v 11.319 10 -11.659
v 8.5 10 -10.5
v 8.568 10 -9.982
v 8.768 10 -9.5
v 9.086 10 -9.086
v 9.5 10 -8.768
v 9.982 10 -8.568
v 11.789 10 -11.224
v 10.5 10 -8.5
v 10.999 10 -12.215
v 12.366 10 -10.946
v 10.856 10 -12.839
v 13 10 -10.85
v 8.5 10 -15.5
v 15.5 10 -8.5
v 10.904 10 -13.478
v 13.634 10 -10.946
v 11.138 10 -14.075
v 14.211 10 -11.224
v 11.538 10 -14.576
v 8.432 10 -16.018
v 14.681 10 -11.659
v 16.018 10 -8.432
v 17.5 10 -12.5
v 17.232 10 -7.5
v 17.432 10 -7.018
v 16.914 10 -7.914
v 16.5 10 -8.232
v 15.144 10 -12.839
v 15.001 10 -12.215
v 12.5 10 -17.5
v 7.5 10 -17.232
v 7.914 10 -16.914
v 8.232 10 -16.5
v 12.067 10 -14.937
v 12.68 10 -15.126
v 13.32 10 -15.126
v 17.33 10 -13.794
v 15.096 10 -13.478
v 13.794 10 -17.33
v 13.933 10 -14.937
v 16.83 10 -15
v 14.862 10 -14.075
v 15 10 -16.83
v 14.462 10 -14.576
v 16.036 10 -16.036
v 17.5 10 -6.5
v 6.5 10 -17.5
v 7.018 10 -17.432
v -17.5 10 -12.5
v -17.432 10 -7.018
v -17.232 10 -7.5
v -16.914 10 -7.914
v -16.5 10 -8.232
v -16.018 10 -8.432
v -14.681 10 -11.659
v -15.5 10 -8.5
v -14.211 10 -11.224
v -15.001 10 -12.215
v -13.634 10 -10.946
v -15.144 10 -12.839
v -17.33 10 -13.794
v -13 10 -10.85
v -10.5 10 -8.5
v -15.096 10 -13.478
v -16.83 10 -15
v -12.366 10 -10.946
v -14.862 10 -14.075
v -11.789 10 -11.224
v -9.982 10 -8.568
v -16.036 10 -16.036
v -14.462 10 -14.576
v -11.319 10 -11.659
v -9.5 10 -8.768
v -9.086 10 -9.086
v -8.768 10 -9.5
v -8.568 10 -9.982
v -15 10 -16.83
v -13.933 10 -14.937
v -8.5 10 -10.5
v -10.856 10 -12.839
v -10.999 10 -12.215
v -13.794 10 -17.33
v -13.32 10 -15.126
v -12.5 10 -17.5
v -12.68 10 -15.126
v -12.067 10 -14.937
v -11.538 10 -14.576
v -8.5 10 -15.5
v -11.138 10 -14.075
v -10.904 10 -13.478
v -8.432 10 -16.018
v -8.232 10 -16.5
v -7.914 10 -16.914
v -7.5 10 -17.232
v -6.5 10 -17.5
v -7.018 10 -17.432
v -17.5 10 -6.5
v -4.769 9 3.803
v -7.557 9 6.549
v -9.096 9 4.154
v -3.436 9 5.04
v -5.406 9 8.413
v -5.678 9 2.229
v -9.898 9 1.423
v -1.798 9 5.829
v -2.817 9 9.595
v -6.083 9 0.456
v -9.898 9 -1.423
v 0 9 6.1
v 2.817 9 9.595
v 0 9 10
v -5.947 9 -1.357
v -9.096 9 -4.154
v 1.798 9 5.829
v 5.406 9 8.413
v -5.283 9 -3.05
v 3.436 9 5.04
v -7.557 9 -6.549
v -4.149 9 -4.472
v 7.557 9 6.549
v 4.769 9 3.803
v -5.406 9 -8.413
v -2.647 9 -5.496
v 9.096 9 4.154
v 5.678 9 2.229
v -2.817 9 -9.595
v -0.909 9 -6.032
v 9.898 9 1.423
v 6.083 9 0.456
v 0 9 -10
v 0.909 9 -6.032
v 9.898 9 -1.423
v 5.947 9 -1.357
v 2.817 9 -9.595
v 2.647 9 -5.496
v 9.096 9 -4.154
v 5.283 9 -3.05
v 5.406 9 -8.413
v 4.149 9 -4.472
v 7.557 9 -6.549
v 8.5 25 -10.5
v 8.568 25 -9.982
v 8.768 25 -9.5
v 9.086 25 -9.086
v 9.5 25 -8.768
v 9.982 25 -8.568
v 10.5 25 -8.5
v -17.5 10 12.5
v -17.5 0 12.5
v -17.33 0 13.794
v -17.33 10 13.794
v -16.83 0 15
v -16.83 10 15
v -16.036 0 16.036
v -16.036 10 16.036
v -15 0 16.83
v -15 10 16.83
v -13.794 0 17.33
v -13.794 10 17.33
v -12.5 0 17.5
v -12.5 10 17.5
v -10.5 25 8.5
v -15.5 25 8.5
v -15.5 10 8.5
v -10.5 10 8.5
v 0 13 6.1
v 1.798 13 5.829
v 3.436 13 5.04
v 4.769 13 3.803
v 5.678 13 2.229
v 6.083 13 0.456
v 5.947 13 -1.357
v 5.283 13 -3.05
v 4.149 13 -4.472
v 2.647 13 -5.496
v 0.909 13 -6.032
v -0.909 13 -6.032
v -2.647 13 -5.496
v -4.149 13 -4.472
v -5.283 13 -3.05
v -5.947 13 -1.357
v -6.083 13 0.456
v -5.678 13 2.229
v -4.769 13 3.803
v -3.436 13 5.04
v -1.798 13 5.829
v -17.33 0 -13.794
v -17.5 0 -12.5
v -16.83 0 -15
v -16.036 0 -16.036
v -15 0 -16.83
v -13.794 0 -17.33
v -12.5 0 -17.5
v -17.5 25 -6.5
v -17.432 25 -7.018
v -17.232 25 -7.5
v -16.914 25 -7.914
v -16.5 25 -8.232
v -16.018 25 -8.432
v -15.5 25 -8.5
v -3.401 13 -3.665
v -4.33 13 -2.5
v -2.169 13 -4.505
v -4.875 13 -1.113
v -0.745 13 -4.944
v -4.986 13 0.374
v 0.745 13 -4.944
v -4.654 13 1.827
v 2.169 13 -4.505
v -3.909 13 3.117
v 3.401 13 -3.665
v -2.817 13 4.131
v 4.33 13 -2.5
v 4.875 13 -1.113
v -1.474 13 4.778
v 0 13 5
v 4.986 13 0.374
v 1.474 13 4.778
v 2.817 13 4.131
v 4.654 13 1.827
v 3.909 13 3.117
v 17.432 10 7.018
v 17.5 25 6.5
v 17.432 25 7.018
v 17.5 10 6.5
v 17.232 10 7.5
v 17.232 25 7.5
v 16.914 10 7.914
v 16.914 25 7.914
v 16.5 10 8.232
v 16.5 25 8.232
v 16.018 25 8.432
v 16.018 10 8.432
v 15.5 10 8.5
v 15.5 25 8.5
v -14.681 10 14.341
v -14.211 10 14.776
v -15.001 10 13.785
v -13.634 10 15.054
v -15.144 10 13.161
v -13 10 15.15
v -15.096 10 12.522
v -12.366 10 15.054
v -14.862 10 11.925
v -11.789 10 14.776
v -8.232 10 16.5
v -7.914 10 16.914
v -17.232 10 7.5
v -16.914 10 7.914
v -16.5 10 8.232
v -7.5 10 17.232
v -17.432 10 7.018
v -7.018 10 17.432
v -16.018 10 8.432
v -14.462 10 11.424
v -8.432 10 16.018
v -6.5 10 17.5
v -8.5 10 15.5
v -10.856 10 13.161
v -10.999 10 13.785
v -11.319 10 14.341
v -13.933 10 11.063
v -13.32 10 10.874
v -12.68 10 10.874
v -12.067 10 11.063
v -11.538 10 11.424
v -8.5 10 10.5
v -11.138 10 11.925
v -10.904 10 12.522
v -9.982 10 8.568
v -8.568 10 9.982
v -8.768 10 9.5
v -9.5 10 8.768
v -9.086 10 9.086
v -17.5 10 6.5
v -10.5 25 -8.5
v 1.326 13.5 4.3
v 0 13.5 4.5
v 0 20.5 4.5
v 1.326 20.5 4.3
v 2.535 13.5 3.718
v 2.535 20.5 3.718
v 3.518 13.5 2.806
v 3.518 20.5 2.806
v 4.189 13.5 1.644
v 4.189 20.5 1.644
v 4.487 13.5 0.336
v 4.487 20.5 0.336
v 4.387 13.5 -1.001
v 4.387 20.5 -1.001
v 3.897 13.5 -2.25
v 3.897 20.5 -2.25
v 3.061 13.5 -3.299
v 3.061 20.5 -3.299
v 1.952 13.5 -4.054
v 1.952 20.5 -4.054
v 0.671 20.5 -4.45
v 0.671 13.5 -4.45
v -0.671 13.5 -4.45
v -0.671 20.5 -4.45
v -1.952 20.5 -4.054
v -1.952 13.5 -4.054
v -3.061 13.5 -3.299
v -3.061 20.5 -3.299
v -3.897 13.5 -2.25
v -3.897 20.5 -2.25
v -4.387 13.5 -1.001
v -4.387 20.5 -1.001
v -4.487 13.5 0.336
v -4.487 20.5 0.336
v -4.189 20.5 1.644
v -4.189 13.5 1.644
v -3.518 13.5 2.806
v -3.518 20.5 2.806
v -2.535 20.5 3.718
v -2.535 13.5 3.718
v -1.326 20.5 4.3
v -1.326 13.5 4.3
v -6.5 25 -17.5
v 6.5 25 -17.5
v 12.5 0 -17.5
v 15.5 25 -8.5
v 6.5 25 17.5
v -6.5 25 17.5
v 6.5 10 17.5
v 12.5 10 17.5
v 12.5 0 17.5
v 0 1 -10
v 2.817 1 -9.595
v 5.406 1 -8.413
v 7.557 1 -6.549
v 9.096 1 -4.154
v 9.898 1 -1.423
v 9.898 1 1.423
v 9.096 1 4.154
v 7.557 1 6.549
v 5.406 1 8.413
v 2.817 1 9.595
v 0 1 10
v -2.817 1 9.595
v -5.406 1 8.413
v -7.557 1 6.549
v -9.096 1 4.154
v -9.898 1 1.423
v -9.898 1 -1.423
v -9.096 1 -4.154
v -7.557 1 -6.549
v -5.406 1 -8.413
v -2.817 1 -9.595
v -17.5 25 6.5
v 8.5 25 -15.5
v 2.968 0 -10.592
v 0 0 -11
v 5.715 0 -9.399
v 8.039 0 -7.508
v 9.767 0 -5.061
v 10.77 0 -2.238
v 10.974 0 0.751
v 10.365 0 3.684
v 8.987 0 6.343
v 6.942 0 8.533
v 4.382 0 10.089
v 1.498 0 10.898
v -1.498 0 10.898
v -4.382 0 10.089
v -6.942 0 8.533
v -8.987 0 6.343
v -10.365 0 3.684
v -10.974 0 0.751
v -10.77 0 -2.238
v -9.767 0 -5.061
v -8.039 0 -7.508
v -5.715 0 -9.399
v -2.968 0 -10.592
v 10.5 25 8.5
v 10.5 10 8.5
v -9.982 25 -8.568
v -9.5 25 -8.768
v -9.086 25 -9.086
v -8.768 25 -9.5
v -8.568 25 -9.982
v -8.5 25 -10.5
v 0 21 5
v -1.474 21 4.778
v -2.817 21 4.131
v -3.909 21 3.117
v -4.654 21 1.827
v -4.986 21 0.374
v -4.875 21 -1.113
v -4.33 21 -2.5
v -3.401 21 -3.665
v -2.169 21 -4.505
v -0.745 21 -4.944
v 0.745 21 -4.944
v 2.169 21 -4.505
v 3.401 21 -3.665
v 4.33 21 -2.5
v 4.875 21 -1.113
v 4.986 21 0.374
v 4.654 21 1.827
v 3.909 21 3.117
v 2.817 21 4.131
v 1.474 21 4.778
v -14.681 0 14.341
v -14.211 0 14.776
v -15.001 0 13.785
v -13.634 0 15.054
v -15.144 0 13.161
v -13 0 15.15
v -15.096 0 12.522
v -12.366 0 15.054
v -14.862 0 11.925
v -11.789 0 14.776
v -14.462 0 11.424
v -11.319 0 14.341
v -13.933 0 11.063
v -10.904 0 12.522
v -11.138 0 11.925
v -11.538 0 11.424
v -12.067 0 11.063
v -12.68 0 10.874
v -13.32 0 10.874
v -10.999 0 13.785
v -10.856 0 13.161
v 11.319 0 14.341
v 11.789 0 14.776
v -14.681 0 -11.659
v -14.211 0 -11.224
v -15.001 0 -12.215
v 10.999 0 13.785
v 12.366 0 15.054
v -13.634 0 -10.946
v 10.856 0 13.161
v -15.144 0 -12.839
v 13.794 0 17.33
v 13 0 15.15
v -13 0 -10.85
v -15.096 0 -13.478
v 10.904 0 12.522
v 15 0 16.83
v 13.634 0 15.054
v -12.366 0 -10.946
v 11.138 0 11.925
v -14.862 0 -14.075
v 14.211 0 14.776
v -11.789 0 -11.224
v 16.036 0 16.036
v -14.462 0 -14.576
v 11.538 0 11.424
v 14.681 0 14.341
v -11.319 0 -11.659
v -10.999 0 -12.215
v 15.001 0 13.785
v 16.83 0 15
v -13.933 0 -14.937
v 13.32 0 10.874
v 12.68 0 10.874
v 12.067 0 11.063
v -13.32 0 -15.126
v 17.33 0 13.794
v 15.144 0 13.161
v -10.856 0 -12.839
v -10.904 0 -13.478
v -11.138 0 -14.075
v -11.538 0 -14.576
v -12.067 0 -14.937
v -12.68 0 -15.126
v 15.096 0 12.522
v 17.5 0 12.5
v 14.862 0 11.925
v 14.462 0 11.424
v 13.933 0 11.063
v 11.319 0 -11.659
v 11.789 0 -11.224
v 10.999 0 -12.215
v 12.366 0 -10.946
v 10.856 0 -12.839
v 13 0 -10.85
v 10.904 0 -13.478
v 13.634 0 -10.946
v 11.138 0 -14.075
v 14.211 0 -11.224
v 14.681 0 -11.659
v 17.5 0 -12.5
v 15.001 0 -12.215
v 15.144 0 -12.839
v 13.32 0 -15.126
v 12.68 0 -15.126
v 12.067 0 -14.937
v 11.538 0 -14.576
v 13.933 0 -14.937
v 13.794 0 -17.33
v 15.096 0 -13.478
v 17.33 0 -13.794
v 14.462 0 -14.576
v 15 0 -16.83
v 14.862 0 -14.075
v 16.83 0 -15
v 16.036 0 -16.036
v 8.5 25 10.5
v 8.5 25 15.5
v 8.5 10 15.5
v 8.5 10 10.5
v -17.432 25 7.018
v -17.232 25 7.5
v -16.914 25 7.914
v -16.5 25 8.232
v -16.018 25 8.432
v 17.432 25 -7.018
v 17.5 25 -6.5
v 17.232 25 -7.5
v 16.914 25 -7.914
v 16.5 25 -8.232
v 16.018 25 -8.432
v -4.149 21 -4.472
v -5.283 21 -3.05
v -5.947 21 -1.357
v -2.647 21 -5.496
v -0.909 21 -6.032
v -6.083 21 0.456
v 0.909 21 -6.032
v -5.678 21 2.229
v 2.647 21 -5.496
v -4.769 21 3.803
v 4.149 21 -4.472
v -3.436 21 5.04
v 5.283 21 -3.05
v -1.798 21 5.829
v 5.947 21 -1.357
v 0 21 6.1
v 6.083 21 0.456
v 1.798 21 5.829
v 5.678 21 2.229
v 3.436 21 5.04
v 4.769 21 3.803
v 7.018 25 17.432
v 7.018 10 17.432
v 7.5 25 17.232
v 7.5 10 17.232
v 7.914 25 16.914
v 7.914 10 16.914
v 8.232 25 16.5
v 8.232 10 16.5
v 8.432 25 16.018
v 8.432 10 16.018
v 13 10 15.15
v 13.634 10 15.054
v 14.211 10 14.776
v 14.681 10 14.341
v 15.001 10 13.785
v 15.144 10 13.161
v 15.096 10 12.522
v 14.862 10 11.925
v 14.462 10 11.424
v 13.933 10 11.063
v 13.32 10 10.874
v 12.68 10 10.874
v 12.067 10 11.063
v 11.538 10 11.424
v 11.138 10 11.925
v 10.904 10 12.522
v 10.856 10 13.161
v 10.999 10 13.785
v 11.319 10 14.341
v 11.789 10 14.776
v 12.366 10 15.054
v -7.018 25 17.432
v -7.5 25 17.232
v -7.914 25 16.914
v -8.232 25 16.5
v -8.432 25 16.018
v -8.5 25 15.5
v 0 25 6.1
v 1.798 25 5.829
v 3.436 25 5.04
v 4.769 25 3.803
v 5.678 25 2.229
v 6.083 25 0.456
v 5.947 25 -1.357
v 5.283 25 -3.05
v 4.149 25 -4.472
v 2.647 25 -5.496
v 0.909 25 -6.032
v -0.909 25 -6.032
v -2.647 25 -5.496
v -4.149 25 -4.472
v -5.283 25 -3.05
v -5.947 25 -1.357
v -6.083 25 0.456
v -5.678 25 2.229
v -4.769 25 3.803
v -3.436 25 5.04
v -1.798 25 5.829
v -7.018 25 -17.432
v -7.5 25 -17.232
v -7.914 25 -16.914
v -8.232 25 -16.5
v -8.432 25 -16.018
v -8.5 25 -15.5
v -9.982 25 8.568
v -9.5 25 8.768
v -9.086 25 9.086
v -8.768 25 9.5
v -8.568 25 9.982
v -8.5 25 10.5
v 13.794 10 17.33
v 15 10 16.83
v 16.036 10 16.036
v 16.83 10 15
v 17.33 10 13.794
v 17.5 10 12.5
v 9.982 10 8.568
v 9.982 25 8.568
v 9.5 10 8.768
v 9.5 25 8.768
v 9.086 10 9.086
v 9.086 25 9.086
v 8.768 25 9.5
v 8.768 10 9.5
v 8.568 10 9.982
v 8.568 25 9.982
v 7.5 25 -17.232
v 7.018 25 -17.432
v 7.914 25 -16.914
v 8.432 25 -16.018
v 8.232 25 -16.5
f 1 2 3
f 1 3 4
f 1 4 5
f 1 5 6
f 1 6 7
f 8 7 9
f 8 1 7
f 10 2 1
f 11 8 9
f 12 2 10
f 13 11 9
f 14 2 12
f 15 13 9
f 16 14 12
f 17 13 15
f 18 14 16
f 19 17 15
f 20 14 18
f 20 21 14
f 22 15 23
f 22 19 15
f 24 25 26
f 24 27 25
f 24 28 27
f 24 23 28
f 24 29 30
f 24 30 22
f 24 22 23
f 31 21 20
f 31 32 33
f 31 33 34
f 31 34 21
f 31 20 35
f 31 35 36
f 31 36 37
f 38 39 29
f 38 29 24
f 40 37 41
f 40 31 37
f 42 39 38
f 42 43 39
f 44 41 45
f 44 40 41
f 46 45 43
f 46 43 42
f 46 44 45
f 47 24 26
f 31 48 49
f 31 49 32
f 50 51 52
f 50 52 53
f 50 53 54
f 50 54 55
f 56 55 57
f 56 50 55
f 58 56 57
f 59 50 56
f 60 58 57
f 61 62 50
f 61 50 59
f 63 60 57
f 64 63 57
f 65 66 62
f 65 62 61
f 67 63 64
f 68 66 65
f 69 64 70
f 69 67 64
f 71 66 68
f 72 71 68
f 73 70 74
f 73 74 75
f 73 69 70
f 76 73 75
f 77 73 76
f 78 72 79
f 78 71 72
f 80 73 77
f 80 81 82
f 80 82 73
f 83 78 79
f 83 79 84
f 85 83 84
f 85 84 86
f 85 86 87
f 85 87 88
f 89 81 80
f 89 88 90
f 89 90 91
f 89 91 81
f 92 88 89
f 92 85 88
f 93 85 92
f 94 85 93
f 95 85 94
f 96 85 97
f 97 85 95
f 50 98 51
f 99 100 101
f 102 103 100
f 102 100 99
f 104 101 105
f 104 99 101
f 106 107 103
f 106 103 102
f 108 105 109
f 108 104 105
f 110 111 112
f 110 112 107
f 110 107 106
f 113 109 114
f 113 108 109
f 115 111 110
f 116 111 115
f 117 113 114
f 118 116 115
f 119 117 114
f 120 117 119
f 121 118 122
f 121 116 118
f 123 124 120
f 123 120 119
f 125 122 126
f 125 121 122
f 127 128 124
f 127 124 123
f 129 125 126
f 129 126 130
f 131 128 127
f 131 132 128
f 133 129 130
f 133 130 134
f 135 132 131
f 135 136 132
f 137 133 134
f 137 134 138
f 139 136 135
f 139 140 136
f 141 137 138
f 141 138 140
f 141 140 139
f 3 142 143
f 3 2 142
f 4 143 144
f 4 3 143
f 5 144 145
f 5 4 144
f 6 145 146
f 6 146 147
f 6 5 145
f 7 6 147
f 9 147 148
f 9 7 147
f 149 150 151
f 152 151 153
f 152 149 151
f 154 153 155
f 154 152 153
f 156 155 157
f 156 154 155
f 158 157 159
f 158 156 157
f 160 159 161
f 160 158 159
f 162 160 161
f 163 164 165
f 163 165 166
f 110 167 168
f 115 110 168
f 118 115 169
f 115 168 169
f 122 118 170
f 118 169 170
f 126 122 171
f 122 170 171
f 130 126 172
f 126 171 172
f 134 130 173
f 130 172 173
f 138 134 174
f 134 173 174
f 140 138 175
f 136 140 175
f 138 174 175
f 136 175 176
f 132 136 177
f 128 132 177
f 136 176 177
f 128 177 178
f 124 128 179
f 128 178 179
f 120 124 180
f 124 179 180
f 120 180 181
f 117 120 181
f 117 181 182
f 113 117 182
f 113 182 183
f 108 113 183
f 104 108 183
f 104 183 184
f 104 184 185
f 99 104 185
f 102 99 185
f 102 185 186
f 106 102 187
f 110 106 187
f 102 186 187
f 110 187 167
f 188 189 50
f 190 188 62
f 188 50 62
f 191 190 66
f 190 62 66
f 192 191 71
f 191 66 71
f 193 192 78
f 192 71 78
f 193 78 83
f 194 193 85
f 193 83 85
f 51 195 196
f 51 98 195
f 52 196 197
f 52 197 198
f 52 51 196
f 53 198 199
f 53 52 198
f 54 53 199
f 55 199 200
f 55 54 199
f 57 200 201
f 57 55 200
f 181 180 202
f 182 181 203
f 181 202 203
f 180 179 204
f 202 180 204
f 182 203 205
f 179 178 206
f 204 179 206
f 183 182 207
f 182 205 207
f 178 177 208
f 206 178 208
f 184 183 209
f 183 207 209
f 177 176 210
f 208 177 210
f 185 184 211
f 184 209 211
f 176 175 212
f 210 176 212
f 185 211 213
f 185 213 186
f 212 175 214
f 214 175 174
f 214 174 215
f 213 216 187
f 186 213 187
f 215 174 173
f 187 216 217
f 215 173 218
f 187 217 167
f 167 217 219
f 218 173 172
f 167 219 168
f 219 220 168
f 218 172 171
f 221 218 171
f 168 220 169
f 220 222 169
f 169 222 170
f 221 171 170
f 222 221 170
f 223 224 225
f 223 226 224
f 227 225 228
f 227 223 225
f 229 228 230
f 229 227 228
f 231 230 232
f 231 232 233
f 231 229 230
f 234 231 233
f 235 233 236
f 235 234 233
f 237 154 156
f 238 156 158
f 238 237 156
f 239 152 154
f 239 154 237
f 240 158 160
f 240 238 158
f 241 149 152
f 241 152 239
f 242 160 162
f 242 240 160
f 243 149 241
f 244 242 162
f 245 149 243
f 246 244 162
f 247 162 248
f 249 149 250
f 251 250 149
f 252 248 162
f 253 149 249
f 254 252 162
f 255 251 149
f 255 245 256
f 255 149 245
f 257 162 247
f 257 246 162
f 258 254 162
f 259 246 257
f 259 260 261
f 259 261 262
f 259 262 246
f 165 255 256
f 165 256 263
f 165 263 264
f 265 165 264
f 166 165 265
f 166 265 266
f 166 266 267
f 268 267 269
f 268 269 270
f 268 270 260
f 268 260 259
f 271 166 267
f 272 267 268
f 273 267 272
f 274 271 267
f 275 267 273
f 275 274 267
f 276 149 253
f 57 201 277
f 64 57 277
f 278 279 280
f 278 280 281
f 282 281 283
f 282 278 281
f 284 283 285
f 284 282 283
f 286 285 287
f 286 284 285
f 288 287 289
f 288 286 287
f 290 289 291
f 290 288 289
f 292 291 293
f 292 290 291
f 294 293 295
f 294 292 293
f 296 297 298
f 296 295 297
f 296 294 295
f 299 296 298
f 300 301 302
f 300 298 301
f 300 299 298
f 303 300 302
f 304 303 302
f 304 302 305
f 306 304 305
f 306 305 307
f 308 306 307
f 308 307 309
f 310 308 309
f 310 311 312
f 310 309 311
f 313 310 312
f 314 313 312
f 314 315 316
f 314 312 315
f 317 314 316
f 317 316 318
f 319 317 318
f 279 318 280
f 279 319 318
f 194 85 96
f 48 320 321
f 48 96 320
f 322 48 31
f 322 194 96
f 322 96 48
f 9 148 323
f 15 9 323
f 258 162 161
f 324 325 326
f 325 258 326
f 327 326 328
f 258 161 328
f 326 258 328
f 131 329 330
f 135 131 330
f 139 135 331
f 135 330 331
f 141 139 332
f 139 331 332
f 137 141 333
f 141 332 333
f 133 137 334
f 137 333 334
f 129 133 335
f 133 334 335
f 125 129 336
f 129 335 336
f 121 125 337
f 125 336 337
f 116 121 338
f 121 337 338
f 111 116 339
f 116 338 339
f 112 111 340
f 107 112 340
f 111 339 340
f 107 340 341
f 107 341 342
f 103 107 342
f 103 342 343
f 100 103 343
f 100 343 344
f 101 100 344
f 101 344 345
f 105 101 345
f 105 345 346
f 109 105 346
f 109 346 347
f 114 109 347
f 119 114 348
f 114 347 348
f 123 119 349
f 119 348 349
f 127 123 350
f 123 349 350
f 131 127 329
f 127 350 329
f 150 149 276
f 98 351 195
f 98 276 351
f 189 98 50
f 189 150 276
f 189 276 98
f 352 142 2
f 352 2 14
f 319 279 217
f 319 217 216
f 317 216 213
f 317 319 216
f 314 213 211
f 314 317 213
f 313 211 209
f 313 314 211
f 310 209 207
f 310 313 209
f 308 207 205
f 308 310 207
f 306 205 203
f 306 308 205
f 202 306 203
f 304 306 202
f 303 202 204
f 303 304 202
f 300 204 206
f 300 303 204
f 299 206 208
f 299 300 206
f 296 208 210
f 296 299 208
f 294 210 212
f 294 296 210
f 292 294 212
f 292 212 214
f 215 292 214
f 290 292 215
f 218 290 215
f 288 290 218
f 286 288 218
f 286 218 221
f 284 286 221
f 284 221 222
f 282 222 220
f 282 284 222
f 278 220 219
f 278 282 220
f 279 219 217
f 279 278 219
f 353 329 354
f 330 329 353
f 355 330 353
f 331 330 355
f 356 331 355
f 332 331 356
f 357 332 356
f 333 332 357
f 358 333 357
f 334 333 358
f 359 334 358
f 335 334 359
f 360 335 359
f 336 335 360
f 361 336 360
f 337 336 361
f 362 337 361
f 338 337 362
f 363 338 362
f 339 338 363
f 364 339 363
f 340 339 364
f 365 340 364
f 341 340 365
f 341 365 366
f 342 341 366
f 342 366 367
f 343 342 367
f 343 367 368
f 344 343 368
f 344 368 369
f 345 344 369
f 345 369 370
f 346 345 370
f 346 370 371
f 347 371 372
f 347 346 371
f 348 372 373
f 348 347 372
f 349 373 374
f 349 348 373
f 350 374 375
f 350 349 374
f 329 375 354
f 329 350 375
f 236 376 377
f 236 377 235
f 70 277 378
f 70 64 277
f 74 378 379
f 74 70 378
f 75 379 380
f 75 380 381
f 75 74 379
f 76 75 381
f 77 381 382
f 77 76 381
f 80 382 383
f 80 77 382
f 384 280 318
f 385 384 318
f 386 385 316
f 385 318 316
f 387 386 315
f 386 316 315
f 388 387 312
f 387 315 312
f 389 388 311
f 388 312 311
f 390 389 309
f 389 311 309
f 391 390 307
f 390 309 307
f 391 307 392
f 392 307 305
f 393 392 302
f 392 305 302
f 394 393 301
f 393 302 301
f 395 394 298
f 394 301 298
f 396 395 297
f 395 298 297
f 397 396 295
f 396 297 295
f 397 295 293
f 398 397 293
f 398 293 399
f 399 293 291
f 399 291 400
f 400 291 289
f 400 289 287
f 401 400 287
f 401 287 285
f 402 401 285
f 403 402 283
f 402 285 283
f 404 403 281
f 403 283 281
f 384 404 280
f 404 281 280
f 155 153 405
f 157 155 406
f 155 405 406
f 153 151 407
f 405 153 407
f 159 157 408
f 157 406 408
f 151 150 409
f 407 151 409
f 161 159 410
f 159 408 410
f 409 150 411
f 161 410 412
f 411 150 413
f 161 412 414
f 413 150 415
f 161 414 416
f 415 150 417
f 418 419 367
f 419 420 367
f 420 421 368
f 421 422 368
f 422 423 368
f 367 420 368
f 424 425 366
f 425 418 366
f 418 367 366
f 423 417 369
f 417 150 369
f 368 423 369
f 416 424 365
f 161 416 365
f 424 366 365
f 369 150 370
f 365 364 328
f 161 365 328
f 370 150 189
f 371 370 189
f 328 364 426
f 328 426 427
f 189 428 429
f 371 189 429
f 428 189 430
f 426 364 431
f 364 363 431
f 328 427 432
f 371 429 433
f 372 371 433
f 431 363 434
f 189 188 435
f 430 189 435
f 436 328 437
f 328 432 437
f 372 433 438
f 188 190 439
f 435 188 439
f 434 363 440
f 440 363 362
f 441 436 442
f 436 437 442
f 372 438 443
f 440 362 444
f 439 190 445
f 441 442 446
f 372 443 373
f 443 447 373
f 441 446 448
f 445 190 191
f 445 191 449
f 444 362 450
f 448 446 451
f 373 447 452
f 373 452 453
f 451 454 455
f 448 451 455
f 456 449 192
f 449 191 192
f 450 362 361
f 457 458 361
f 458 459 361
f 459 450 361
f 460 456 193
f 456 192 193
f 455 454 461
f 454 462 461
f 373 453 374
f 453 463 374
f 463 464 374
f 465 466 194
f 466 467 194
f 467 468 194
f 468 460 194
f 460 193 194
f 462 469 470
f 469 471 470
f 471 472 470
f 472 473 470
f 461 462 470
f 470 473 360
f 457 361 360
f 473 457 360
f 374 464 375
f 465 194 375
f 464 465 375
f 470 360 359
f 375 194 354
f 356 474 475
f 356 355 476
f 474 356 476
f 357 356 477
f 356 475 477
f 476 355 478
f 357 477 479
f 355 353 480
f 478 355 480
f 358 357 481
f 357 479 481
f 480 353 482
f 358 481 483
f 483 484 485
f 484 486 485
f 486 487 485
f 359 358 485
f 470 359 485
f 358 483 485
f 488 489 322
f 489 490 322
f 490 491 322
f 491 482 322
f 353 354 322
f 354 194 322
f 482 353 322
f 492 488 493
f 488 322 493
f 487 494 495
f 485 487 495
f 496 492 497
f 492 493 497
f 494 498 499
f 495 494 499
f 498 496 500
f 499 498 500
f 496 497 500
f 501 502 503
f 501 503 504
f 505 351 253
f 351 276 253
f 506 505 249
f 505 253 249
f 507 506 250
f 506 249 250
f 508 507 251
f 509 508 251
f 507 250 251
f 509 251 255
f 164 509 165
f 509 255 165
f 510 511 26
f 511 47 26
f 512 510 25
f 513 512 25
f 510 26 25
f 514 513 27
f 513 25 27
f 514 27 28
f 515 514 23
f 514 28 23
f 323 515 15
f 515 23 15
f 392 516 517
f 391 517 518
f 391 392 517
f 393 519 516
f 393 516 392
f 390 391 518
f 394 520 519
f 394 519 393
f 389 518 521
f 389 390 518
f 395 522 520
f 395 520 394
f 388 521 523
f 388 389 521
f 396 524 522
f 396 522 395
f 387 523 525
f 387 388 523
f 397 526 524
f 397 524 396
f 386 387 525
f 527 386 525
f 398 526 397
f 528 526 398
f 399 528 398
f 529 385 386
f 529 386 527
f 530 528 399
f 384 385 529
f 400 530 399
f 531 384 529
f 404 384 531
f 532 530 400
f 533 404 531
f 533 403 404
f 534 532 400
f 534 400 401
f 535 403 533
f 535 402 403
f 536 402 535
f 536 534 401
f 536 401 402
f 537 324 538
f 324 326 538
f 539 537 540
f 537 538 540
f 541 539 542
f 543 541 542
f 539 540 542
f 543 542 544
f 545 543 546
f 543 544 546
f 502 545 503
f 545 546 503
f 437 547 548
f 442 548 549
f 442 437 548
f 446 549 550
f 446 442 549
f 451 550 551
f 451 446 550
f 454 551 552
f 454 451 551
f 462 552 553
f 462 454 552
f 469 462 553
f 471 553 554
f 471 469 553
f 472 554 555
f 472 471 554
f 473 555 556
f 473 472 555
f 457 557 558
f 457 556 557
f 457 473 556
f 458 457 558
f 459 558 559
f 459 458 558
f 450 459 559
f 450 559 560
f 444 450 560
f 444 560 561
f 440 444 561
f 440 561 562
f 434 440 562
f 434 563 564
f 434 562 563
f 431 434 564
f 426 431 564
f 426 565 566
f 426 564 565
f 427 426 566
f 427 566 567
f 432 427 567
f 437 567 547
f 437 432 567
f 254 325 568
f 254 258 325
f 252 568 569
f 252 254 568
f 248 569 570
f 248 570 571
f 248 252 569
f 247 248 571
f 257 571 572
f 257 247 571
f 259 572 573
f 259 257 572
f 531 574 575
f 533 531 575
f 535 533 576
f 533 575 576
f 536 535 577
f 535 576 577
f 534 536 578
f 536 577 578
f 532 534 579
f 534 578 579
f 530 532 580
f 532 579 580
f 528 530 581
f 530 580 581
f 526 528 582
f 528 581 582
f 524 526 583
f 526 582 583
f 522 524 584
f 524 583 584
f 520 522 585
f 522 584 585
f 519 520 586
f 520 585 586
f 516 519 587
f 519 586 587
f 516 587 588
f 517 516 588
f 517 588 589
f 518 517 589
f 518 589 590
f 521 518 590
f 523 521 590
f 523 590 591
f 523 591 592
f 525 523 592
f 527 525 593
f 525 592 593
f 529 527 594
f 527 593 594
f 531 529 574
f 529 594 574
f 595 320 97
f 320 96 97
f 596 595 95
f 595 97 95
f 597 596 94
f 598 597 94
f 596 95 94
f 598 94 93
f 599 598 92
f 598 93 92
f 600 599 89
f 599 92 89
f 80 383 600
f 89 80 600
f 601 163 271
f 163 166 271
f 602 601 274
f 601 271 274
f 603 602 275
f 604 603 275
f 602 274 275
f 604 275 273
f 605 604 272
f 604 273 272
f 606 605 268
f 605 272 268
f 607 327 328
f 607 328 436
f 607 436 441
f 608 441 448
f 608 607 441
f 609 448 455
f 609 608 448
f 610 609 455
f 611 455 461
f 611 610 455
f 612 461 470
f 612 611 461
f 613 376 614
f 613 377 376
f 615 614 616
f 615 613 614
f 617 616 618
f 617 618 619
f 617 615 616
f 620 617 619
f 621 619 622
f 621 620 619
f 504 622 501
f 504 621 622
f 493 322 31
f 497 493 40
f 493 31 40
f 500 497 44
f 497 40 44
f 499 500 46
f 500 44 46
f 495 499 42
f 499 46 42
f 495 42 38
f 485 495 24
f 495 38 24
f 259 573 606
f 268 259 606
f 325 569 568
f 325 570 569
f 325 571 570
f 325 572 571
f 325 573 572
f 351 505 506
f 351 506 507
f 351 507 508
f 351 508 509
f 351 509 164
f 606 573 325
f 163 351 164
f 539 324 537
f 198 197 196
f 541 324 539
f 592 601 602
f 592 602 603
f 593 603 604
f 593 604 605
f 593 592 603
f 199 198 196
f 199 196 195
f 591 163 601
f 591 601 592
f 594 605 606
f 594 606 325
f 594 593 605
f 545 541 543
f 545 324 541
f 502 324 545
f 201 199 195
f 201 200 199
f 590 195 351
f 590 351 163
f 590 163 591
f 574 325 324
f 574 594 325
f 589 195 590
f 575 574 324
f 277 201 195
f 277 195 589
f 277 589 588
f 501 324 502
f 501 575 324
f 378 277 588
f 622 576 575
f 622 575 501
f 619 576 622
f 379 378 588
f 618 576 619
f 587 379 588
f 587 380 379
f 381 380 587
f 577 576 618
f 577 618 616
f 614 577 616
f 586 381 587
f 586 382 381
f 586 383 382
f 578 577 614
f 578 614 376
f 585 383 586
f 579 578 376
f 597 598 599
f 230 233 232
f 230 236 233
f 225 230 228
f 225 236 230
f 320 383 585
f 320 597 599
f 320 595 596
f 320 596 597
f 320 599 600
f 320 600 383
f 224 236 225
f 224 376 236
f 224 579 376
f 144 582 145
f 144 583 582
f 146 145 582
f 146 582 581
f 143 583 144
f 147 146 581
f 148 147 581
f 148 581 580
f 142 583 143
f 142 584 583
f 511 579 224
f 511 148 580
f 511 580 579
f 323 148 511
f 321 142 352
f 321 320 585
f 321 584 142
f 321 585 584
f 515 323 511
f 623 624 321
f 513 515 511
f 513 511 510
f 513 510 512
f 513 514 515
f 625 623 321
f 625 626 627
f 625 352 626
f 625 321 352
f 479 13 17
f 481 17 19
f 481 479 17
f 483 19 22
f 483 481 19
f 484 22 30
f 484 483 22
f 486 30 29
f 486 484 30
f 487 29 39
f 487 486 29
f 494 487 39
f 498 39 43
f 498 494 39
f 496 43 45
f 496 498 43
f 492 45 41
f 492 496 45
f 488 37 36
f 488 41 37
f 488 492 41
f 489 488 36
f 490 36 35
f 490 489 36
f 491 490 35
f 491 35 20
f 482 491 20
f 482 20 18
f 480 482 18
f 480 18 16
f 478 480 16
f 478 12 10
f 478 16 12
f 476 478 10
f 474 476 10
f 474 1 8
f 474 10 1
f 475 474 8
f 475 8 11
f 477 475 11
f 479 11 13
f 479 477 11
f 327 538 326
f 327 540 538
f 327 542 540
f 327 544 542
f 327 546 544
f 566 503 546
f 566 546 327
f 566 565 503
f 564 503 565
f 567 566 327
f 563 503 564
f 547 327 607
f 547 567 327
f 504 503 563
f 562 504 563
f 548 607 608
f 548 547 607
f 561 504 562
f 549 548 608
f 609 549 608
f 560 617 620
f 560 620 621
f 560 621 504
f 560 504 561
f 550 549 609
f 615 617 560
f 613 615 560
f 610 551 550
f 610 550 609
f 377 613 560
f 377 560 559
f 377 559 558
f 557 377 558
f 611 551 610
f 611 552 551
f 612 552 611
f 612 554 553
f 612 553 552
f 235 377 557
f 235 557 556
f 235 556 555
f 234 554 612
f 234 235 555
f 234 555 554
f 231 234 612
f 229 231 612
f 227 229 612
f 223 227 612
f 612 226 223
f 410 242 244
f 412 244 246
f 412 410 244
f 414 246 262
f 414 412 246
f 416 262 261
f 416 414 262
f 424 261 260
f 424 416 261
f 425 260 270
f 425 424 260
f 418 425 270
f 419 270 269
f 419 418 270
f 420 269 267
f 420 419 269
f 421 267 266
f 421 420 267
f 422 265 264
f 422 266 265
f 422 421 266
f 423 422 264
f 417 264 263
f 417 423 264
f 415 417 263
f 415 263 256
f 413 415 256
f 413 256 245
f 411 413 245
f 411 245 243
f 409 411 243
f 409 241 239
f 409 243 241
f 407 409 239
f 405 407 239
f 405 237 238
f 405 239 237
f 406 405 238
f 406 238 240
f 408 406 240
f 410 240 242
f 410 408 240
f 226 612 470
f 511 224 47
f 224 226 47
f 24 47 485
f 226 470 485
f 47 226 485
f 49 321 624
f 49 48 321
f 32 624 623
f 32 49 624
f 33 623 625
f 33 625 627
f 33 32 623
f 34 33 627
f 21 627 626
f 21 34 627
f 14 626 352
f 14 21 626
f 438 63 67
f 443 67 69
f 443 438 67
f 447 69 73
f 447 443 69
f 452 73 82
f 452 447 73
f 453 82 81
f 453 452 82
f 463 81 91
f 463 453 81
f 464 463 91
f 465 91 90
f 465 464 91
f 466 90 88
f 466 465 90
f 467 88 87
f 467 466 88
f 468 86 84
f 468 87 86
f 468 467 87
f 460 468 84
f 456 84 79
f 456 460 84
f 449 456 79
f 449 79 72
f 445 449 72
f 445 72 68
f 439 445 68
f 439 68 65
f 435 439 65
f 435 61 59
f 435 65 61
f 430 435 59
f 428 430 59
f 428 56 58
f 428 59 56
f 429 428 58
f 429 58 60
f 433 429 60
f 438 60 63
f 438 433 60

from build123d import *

# Parameters (mm, degrees)
SKETCH_1_W          = 35
SKETCH_1_H          = 35
SKETCH_1_R          = 4.5
SKETCH_1_R_2        = 2.15
EXTRUDE_1_DEPTH     = 25
FILLET_1_R          = 5
SKETCH_3_R          = 6.1
CUT_EXTRUDE_1_DEPTH = 4
SKETCH_4_R          = 6.1
CUT_EXTRUDE_2_DEPTH = 4
SKETCH_6_R          = 10
CUT_EXTRUDE_3_DEPTH = 9
SKETCH_7_W          = 9
SKETCH_7_H          = 9
CUT_EXTRUDE_4_DEPTH = 15
FILLET_3_R          = 2
CHAMFER_1_SIZE      = 1
CHAMFER_2_SIZE      = 0.5


with BuildPart() as part:
    # 草图1 → 凸台-拉伸1 (new body)
    with BuildSketch(Plane(origin=(0, 0, 0), x_dir=(1, 0, 0), z_dir=(0, 1, 0))):
        Rectangle(SKETCH_1_W, SKETCH_1_H)
        with Locations(Location((0, 0, 0), (0, 0, 270))):
            Circle(SKETCH_1_R, mode=Mode.SUBTRACT)
        with Locations(Location((13, 13, 0), (0, 0, 270))):
            Circle(SKETCH_1_R_2, mode=Mode.SUBTRACT)
        with Locations(Location((13, -13, 0), (0, 0, 270))):
            Circle(SKETCH_1_R_2, mode=Mode.SUBTRACT)
        with Locations(Location((-13, -13, 0), (0, 0, 270))):
            Circle(SKETCH_1_R_2, mode=Mode.SUBTRACT)
        with Locations(Location((-13, 13, 0), (0, 0, 270))):
            Circle(SKETCH_1_R_2, mode=Mode.SUBTRACT)
    extrude(amount=EXTRUDE_1_DEPTH)

    # 圆角1
    fillet_1_edges = [part.edges().sort_by_distance(p)[0] for p in [
        (17.5, 12.5, 17.5),
        (-17.5, 12.5, 17.5),
        (-17.5, 12.5, -17.5),
        (17.5, 12.5, -17.5),
    ]]
    fillet(fillet_1_edges, radius=FILLET_1_R)

    # 草图3 → 切除-拉伸1 (cut)
    with BuildSketch(Plane(origin=(0, 25, 0), x_dir=(1, 0, 0), z_dir=(0, 1, 0))):
        with Locations(Location((0, 0, 0), (0, 0, 270))):
            Circle(SKETCH_3_R)
    extrude(amount=-CUT_EXTRUDE_1_DEPTH, mode=Mode.SUBTRACT)

    # 草图4 → 切除-拉伸2 (cut)
    with BuildSketch(Plane(origin=(0, 13, 0), x_dir=(1, 0, 0), z_dir=(0, 1, 0))):
        with Locations(Location((0, 0, 0), (0, 0, 270))):
            Circle(SKETCH_4_R)
    extrude(amount=-CUT_EXTRUDE_2_DEPTH, mode=Mode.SUBTRACT)

    # 草图6 → 切除-拉伸3 (cut)
    with BuildSketch(Plane.XZ):
        with Locations(Location((0, 0, 0), (0, 0, 270))):
            Circle(SKETCH_6_R)
    extrude(amount=-CUT_EXTRUDE_3_DEPTH, mode=Mode.SUBTRACT)

    # 草图7 → 切除-拉伸4 (cut)
    with BuildSketch(Plane(origin=(0, 25, 0), x_dir=(1, 0, 0), z_dir=(0, 1, 0))):
        with Locations((-13, 13)):
            Rectangle(SKETCH_7_W, SKETCH_7_H)
        with Locations((13, 13)):
            Rectangle(SKETCH_7_W, SKETCH_7_H)
        with Locations((13, -13)):
            Rectangle(SKETCH_7_W, SKETCH_7_H)
        with Locations((-13, -13)):
            Rectangle(SKETCH_7_W, SKETCH_7_H)
    extrude(amount=-CUT_EXTRUDE_4_DEPTH, mode=Mode.SUBTRACT)

    # 圆角3
    fillet_3_edges = [part.edges().sort_by_distance(p)[0] for p in [
        (-17.5, 17.5, 8.5),
        (-8.5, 17.5, 8.5),
        (-8.5, 17.5, 17.5),
        (8.5, 17.5, 17.5),
        (8.5, 17.5, 8.5),
        (17.5, 17.5, 8.5),
        (17.5, 17.5, -8.5),
        (8.5, 17.5, -8.5),
        (8.5, 17.5, -17.5),
        (-8.5, 17.5, -17.5),
        (-8.5, 17.5, -8.5),
        (-17.5, 17.5, -8.5),
    ]]
    fillet(fillet_3_edges, radius=FILLET_3_R)

    # 倒角1
    chamfer_1_edges = [part.edges().sort_by_distance(p)[0] for p in [
        (0, 0, 10),
    ]]
    chamfer(chamfer_1_edges, length=CHAMFER_1_SIZE)

    # 倒角2
    chamfer_2_edges = [part.edges().sort_by_distance(p)[0] for p in [
        (0, 21, -4.5),
        (0, 13, -4.5),
    ]]
    chamfer(chamfer_2_edges, length=CHAMFER_2_SIZE)


solid = part.part
